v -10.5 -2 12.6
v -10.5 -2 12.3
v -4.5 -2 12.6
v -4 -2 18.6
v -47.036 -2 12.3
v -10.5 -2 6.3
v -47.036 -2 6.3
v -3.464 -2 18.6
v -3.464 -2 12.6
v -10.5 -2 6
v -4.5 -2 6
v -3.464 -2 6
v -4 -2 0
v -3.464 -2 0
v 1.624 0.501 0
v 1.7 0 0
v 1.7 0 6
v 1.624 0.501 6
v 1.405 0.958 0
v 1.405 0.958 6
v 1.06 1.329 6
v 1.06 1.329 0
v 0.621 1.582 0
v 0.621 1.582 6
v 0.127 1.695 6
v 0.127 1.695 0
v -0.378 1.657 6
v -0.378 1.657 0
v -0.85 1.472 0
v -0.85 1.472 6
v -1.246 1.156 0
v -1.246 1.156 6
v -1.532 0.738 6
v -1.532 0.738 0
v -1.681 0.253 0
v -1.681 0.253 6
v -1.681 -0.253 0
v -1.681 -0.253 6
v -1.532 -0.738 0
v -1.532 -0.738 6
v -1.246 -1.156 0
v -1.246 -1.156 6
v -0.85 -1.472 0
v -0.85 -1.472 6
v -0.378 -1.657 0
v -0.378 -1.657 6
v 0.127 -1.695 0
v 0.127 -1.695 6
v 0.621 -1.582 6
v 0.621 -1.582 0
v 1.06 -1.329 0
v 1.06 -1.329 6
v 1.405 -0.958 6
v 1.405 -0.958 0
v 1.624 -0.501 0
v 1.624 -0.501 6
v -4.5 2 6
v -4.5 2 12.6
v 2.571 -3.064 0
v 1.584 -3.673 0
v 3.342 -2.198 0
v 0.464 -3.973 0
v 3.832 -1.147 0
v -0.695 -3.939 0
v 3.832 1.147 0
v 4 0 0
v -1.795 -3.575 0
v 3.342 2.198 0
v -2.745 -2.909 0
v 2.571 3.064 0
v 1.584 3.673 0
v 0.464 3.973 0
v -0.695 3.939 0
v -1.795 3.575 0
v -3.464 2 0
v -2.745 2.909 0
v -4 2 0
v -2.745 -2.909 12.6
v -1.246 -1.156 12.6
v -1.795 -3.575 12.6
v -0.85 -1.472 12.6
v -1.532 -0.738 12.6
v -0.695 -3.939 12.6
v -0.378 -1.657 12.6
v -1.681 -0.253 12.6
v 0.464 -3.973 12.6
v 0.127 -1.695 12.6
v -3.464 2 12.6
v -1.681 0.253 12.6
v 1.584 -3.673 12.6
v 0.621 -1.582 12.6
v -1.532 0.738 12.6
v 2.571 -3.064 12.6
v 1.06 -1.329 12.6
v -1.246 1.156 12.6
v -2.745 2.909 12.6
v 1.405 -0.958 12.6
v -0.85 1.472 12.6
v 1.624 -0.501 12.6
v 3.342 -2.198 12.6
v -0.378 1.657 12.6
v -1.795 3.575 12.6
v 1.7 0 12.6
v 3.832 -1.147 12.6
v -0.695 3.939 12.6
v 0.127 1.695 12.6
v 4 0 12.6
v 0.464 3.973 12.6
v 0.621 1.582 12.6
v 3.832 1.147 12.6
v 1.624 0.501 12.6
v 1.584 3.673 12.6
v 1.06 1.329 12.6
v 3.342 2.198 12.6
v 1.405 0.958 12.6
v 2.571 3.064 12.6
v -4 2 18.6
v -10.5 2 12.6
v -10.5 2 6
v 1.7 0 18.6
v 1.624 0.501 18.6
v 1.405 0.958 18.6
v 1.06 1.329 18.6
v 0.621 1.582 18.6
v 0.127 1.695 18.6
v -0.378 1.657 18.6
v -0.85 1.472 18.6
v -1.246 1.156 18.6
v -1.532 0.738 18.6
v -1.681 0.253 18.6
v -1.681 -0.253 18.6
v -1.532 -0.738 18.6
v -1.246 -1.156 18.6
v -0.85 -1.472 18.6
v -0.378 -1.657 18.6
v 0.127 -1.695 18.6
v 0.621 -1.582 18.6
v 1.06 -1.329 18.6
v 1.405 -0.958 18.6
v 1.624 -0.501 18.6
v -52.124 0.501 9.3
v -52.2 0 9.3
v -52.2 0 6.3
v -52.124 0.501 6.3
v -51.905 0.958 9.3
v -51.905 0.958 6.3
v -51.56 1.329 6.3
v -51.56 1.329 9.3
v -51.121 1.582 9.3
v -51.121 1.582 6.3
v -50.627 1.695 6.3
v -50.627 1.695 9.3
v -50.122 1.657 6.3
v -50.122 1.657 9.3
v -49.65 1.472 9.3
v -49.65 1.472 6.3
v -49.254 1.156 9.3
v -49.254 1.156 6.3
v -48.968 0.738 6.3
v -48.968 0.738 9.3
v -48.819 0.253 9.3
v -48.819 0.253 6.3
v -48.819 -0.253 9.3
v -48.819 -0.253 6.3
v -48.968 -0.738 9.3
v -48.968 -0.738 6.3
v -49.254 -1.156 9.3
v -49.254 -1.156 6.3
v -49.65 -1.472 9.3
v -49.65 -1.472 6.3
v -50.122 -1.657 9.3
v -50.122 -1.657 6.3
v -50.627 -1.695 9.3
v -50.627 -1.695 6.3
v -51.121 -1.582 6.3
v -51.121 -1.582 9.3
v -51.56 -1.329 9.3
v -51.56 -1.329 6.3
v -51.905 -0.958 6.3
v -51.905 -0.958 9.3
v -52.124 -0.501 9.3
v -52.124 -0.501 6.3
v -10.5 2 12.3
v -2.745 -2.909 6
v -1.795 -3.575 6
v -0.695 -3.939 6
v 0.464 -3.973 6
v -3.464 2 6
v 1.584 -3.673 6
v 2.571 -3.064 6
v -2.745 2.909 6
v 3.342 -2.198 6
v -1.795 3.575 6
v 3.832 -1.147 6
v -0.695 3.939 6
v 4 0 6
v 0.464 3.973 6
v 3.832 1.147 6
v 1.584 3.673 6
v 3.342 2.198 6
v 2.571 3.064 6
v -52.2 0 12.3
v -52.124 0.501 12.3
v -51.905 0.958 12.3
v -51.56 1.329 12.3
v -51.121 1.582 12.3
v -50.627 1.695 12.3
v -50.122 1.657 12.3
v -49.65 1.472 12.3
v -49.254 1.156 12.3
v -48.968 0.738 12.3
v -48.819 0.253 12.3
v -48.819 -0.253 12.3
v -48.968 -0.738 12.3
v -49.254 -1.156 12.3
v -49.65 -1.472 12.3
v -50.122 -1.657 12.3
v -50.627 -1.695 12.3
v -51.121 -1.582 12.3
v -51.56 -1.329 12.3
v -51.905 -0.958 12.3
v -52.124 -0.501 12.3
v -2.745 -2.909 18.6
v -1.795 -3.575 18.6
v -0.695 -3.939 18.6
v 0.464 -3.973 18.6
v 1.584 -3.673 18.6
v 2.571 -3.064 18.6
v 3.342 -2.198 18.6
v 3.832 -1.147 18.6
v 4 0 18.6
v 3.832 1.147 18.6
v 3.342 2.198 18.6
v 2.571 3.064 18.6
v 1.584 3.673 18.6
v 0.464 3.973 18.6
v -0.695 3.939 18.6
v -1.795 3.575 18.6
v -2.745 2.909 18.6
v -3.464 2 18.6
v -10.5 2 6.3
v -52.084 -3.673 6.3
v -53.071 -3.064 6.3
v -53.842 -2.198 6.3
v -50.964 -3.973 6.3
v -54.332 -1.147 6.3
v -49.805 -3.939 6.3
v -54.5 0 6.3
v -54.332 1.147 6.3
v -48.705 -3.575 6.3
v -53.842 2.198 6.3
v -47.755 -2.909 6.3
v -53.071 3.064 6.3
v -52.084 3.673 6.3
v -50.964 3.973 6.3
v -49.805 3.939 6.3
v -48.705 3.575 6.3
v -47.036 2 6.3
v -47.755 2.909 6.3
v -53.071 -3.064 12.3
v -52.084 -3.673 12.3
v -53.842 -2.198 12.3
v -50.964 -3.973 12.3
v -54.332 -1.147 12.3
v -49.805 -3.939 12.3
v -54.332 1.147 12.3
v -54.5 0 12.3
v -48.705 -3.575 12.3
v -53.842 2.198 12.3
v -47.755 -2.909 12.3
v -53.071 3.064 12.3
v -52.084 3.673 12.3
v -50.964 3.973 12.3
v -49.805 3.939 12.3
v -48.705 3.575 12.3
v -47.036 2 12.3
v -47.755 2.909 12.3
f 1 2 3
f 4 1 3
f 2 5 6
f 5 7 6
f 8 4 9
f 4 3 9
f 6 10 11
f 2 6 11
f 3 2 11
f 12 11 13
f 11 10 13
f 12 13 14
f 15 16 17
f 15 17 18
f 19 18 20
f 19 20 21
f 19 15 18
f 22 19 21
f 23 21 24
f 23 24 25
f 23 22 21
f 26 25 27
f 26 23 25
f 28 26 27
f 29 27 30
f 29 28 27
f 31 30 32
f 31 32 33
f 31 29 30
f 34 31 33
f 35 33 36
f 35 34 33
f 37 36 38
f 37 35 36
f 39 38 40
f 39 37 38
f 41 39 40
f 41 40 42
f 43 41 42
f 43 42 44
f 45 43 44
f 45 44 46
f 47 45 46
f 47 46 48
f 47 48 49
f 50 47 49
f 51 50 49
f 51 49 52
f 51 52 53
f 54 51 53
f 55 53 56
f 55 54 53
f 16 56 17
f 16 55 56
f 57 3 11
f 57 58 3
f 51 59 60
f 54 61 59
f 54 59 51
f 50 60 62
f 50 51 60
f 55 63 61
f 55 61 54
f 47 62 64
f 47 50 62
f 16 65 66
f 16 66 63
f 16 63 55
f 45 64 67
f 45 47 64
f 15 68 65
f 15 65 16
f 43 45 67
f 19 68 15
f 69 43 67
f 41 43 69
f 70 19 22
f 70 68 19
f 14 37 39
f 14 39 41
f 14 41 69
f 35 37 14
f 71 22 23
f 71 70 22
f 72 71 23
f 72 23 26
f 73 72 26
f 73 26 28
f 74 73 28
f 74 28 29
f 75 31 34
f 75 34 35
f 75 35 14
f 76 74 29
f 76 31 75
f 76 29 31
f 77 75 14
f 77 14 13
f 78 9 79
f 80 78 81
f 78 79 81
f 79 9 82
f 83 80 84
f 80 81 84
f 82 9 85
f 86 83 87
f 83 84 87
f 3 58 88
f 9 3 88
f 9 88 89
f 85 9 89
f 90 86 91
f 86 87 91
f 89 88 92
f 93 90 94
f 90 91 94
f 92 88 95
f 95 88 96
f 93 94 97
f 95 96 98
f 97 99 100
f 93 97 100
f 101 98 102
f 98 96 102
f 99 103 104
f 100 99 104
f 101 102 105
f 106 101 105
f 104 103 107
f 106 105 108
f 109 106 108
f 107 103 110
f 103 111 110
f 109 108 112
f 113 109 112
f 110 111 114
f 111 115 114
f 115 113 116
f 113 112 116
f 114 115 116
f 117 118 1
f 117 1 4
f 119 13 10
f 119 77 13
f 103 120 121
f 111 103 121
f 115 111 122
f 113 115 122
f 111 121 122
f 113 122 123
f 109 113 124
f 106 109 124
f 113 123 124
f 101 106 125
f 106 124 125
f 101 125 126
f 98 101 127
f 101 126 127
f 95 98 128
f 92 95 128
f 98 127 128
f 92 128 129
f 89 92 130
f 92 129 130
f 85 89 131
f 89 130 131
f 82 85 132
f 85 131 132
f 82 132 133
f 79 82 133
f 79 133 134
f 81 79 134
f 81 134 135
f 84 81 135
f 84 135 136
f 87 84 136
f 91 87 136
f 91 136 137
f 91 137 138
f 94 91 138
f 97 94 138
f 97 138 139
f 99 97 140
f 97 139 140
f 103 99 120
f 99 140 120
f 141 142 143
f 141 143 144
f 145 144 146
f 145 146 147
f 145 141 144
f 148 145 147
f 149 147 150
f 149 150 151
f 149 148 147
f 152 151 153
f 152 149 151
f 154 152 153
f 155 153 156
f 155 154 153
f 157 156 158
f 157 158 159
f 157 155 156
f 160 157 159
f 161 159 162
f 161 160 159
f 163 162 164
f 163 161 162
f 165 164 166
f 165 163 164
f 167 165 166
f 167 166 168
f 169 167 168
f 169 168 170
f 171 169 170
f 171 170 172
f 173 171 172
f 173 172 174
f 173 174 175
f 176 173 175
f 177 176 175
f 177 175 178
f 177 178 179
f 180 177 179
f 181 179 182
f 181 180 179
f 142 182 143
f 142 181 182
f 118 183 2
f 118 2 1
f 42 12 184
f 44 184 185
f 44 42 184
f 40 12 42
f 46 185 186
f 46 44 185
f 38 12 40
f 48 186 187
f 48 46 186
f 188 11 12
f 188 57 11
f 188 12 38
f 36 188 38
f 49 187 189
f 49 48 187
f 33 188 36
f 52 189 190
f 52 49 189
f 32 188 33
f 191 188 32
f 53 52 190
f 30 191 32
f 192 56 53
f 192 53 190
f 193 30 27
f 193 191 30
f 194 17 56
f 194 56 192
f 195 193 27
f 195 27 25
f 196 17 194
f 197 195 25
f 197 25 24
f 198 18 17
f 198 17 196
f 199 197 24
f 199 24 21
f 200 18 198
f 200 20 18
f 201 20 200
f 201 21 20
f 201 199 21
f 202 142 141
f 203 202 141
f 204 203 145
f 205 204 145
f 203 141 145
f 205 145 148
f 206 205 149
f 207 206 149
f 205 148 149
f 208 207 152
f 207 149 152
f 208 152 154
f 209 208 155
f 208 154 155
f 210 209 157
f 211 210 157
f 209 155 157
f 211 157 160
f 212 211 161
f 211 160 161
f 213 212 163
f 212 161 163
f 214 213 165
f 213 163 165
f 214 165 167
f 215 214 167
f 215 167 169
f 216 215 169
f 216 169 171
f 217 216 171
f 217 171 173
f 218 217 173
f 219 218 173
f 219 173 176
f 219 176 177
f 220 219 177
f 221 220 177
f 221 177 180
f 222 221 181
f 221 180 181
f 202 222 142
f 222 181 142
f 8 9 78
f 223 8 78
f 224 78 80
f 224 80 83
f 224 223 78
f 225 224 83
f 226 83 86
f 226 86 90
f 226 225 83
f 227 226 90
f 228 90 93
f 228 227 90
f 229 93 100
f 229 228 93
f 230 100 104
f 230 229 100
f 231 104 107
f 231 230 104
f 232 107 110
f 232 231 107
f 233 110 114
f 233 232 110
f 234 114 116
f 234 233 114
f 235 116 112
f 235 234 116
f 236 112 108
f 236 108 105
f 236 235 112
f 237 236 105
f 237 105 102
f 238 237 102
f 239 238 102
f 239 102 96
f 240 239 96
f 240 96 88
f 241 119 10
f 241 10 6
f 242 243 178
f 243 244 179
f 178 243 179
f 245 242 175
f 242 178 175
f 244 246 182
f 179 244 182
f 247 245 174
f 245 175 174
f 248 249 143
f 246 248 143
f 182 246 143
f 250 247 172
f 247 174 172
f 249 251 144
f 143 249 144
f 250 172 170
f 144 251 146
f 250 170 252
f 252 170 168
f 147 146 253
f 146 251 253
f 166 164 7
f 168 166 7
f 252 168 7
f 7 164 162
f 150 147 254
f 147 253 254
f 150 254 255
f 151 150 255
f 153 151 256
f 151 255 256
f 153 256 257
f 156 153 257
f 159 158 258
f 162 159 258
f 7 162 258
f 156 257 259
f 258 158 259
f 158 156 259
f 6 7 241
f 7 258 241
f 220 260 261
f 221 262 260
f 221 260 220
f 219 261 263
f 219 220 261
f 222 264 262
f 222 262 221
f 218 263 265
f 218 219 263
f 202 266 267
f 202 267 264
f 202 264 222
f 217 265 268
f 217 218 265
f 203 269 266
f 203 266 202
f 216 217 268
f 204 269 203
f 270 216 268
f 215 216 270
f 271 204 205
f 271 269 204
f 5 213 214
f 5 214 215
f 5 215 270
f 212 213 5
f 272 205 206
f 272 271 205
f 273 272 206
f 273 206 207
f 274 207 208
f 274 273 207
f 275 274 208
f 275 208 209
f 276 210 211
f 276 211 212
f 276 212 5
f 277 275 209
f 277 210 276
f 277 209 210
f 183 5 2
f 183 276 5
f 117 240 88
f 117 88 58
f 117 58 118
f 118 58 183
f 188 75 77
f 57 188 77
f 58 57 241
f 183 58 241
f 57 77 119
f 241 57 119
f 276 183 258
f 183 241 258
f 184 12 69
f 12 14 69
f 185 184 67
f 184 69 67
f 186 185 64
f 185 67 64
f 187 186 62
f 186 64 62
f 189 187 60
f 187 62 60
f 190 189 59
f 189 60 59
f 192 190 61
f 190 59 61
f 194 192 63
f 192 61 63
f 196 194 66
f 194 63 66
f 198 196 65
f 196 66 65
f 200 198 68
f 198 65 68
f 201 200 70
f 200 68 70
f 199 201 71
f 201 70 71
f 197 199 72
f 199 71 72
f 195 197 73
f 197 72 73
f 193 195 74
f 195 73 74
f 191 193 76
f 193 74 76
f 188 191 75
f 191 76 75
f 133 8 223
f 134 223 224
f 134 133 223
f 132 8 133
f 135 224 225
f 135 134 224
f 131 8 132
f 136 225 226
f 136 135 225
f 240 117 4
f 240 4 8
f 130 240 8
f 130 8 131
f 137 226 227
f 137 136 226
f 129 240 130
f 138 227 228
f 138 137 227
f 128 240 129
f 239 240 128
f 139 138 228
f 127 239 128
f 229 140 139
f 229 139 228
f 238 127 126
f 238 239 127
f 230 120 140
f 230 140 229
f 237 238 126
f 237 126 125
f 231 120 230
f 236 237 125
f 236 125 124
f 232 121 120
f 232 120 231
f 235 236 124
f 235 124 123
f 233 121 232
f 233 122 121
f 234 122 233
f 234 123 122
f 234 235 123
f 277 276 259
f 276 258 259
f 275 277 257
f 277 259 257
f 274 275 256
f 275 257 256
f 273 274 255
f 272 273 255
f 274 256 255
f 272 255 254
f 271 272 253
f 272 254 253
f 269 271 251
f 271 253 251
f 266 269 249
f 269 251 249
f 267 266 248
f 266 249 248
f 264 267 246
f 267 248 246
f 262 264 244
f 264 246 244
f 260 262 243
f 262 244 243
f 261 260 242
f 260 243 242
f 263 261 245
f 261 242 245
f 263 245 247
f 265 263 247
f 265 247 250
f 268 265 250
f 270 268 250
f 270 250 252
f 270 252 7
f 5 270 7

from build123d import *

# Parameters (mm, degrees)
SKETCH_1_R           = 4
SKETCH_1_R_2         = 1.7
EXTRUDE_1_DEPTH      = 6
EXTRUDE_2_DEPTH      = 2
EXTRUDE_2_DEPTH_BACK = 2
EXTRUDE_3_DEPTH      = 3
EXTRUDE_3_DEPTH_BACK = 3
SKETCH_3_R           = 1.7


with BuildPart() as part:
    # Эскиз1 → Бобышка-Вытянуть1 (new body)
    with BuildSketch(Plane.XY):
        Circle(SKETCH_1_R)
        Circle(SKETCH_1_R_2, mode=Mode.SUBTRACT)
    extrude_1 = extrude(amount=EXTRUDE_1_DEPTH)

    # Эскиз2 → Бобышка-Вытянуть2 (add, two sides: drawn at the far end of the back side and taken through both)
    with BuildSketch(Plane(origin=(0, 0, 0), x_dir=(1, 0, 0), z_dir=(0, 1, 0)).offset(-EXTRUDE_2_DEPTH_BACK)):
        Polygon((-4, 0), (-10.5, -6), (-10.5, -12.6), (-4, -18.6), (-3, -18.6), (-3, -12.6), (-4, -12.6), (-4.5, -12.6), (-4.5, -6), (-4, -6), (-3, -6), (-3, 0), align=None)
    extrude(amount=EXTRUDE_2_DEPTH + EXTRUDE_2_DEPTH_BACK)

    # Зеркальное отражение1: Бобышка-Вытянуть1 across plane
    add(extrude_1.mirror(Plane(origin=(0, 0, 9.3), x_dir=(1, 0, 0), z_dir=(0, 0, -1))))

    # Эскиз3 → Бобышка-Вытянуть3 (add, two sides: drawn at the far end of the back side and taken through both)
    with BuildSketch(Plane(origin=(0, 0, 9.3), x_dir=(-1, 0, 0), z_dir=(0, 0, -1)).offset(-EXTRUDE_3_DEPTH_BACK)):
        with BuildLine():
            Line((10.5, 2), (47.035898385, 2))
            ThreePointArc((47.035898385, 2), (54.5, 0), (47.035898385, -2))
            Line((47.035898385, -2), (10.5, -2))
            Line((10.5, -2), (10.5, 2))
        make_face()
        with Locations((50.5, 0)):
            Circle(SKETCH_3_R, mode=Mode.SUBTRACT)
    extrude(amount=EXTRUDE_3_DEPTH + EXTRUDE_3_DEPTH_BACK)


solid = part.part
